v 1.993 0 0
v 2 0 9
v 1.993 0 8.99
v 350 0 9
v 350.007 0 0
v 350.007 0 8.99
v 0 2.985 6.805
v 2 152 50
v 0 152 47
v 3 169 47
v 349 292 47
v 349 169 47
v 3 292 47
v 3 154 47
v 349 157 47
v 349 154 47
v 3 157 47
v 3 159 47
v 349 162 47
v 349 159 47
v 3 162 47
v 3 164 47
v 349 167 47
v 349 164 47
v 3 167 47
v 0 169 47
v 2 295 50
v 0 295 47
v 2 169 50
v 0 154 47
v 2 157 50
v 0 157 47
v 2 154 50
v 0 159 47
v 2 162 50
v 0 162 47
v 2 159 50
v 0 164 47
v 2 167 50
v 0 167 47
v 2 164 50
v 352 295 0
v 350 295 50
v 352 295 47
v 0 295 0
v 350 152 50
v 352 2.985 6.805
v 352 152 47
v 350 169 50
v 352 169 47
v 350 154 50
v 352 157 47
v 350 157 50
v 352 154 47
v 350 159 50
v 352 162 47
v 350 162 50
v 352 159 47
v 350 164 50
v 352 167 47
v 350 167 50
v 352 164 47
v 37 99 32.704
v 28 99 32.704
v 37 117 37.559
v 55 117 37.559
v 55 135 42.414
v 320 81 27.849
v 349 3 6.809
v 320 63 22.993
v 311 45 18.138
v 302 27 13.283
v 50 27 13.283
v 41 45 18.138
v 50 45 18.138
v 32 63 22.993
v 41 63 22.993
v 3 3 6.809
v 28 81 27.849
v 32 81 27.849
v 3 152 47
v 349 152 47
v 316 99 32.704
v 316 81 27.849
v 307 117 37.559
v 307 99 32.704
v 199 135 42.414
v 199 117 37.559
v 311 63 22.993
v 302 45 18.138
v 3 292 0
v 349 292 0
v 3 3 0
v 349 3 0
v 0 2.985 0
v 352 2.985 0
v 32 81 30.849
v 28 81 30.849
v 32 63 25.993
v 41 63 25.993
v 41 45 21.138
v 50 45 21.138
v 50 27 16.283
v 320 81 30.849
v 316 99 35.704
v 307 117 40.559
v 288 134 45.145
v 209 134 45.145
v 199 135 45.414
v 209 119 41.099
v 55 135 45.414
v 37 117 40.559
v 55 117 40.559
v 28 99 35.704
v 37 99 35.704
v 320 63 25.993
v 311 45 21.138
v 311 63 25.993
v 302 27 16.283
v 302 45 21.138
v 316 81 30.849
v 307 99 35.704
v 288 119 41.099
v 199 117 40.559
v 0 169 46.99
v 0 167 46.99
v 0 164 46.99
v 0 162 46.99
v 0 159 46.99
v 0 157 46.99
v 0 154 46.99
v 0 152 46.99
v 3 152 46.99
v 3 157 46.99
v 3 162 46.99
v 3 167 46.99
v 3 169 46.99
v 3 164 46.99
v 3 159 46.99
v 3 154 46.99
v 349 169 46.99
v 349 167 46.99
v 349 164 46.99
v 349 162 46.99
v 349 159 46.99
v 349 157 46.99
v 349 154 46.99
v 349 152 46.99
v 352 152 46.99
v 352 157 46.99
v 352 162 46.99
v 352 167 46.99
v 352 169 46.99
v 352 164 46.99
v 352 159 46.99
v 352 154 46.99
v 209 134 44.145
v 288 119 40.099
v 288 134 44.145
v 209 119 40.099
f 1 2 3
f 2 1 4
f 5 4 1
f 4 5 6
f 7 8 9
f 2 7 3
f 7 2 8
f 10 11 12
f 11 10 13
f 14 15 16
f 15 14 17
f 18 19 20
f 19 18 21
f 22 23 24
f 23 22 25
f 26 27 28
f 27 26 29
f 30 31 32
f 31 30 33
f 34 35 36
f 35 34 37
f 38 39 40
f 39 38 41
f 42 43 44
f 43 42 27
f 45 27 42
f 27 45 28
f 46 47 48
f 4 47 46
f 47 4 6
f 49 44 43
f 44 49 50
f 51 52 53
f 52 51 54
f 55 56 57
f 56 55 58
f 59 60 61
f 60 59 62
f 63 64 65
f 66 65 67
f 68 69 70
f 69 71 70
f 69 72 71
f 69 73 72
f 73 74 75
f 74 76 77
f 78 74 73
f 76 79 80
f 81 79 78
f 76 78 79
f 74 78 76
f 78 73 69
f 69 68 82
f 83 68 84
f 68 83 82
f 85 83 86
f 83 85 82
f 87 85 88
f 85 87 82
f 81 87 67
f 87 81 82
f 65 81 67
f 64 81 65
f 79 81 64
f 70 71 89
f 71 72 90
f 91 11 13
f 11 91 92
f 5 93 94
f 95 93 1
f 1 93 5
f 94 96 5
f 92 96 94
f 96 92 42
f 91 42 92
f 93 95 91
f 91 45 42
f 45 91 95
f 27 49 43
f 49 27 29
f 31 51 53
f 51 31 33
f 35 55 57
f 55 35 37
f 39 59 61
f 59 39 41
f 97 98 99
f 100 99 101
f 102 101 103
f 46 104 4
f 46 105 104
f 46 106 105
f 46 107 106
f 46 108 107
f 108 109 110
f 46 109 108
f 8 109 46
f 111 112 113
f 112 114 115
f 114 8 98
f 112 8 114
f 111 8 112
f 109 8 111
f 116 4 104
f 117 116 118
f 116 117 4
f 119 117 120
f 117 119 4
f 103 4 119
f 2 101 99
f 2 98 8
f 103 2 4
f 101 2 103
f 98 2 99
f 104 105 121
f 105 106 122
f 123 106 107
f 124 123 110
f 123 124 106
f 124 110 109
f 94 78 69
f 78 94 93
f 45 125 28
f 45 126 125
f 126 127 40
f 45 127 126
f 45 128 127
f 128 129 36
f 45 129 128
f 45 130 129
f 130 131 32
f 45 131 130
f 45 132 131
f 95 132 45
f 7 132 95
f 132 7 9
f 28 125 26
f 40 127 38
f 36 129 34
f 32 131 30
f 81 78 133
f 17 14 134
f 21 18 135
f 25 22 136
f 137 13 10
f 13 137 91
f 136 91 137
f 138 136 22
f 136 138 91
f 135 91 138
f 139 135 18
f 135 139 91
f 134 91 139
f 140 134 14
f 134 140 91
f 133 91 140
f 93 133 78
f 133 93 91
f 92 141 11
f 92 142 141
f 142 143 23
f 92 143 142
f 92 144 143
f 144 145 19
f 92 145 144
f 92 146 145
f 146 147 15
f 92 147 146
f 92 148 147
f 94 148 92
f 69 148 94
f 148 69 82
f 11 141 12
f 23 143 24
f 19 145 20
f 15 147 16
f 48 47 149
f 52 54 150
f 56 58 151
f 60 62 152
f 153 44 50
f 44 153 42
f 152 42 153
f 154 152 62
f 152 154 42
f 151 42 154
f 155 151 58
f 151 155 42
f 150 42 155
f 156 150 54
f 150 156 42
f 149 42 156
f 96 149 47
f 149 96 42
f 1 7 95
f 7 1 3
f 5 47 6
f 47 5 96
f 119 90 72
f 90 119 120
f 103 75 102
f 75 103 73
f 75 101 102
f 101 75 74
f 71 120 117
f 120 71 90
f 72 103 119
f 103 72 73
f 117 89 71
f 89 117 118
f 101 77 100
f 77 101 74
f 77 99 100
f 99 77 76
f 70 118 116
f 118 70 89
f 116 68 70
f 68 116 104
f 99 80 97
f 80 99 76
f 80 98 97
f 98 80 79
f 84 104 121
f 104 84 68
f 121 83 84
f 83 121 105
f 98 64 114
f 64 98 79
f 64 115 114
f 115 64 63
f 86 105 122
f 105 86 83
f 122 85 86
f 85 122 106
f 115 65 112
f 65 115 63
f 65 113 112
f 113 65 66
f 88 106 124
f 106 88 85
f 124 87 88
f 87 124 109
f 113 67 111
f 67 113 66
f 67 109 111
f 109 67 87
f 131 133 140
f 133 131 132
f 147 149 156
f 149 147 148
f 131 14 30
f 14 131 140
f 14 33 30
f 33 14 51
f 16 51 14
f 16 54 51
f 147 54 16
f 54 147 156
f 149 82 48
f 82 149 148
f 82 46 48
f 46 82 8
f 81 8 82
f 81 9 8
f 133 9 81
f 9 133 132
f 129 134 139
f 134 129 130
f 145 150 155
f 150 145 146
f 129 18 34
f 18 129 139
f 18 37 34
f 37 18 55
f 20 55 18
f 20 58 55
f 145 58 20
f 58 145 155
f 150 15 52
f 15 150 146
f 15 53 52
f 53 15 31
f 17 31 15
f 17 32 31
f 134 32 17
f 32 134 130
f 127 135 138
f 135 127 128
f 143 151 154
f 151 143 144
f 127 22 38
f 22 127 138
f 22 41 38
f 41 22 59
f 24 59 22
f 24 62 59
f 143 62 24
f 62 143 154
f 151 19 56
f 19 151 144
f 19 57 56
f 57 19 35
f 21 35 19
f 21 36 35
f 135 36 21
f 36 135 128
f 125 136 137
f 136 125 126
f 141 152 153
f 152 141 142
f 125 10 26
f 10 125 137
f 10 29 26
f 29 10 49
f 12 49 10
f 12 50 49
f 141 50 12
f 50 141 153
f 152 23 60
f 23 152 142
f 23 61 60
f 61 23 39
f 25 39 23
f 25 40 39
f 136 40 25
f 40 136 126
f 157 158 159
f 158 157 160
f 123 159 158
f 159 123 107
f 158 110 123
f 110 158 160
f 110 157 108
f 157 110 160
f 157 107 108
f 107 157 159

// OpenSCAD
// Juku top case
// Units: millimeters

outside_width = 352;
outside_depth = 295;
rear_height = 50;
front_height = 9;
wall_thickness = 3;
slope_starts_from_back = 143;
keyboard_row_front_offset = 27;
keyboard_row_left_offset = 50;
keyboard_row_width = 252;
keyboard_row_depth = 18;
keyboard_row_side_step = 9;
keyboard_row_4_left_shift = 4;
keyboard_row_6_right_shift = 18;
keyboard_row_6_width = 144;
side_wall_chamfer_height = 3;
side_wall_chamfer_width = 2;
side_wall_chamfer_z_overlap = 1;
vent_cut_count = 4;
vent_cut_width = 2;
vent_cut_gap = 3;
logo_bevel_width = 79;
logo_bevel_depth_y = 15;
logo_bevel_depth_z = 1;
logo_bevel_x_gap_from_top_row = 10;
logo_bevel_y_gap_from_row_5 = 2;

slope_start_y = outside_depth - slope_starts_from_back;
cut_overlap = 0.01;

assert(wall_thickness > 0);
assert(2 * wall_thickness < outside_width);
assert(2 * wall_thickness < outside_depth);
assert(wall_thickness < front_height);
assert(front_height < rear_height);
assert(slope_starts_from_back > 0);
assert(slope_starts_from_back < outside_depth);
assert(keyboard_row_front_offset > 0);
assert(keyboard_row_left_offset > wall_thickness);
assert(keyboard_row_width > 0);
assert(keyboard_row_depth > 0);
assert(keyboard_row_side_step > 0);
assert(keyboard_row_6_width > 0);
assert(side_wall_chamfer_height > 0);
assert(side_wall_chamfer_width > 0);
assert(side_wall_chamfer_height < front_height);
assert(side_wall_chamfer_width < wall_thickness);
assert(side_wall_chamfer_z_overlap >= 0);
assert(vent_cut_count > 0);
assert(vent_cut_width > 0);
assert(vent_cut_gap > 0);
assert(logo_bevel_width > 0);
assert(logo_bevel_depth_y > 0);
assert(logo_bevel_depth_z > 0);
assert(logo_bevel_depth_z < wall_thickness);
assert(logo_bevel_x_gap_from_top_row >= 0);
assert(logo_bevel_y_gap_from_row_5 >= 0);
assert(
    slope_start_y
    + vent_cut_count * vent_cut_width
    + (vent_cut_count - 1) * vent_cut_gap
    < outside_depth - wall_thickness
);

function top_height_at(y) =
    y < slope_start_y
        ? front_height
            + (rear_height - front_height) * y / slope_start_y
        : rear_height;

function inner_top_height_at(y) = top_height_at(y) - wall_thickness;

module shell_profile_2d() {
    polygon([
        [0, 0],
        [wall_thickness, 0],
        [wall_thickness, inner_top_height_at(wall_thickness)],
        [slope_start_y, inner_top_height_at(slope_start_y)],
        [
            outside_depth - wall_thickness,
            inner_top_height_at(outside_depth - wall_thickness)
        ],
        [outside_depth - wall_thickness, 0],
        [outside_depth, 0],
        [outside_depth, rear_height],
        [slope_start_y, rear_height],
        [0, front_height]
    ]);
}

module shell(width) {
    multmatrix([
        [0, 0, 1, 0],
        [1, 0, 0, 0],
        [0, 1, 0, 0],
        [0, 0, 0, 1]
    ])
        linear_extrude(height = width)
            shell_profile_2d();
}

module side_wall_profile_2d() {
    polygon([
        [0, 0],
        [outside_depth, 0],
        [outside_depth, inner_top_height_at(outside_depth)],
        [slope_start_y, inner_top_height_at(slope_start_y)],
        [0, inner_top_height_at(0)]
    ]);
}

module side_wall(x) {
    translate([x, 0, 0])
        multmatrix([
            [0, 0, 1, 0],
            [1, 0, 0, 0],
            [0, 1, 0, 0],
            [0, 0, 0, 1]
        ])
            linear_extrude(height = wall_thickness)
                side_wall_profile_2d();
}

module side_top_chamfer_fill_segment(x_outer, x_inner, y0, y1) {
    z0 = top_height_at(y0);
    z1 = top_height_at(y1);

    polyhedron(
        points = [
            [x_outer, y0, z0 - side_wall_chamfer_height],
            [x_inner, y0, z0 - side_wall_chamfer_height],
            [x_inner, y0, z0],

            [x_outer, y1, z1 - side_wall_chamfer_height],
            [x_inner, y1, z1 - side_wall_chamfer_height],
            [x_inner, y1, z1]
        ],
        faces = [
            [0, 2, 1],
            [3, 4, 5],
            [0, 3, 5, 2],
            [0, 1, 4, 3],
            [1, 2, 5, 4]
        ]
    );
}

module front_side_chamfer_cut(x_outer, x_inner) {
    translate([0, 0, -cut_overlap])
        linear_extrude(
            height =
                front_height
                + side_wall_chamfer_z_overlap
                + 2 * cut_overlap
        )
            polygon([
                [x_outer, -cut_overlap],
                [x_inner, -cut_overlap],
                [x_outer, side_wall_chamfer_height]
            ]);
}

module left_side_top_chamfers() {
    side_top_chamfer_fill_segment(
        0,
        side_wall_chamfer_width,
        0,
        slope_start_y
    );
    side_top_chamfer_fill_segment(
        0,
        side_wall_chamfer_width,
        slope_start_y,
        outside_depth
    );
}

module right_side_top_chamfers() {
    translate([outside_width, 0, 0])
        mirror([1, 0, 0])
            left_side_top_chamfers();
}

module side_top_chamfers() {
    left_side_top_chamfers();
    right_side_top_chamfers();
}

module side_wall_chamfer_cuts() {
    front_side_chamfer_cut(
        -cut_overlap,
        side_wall_chamfer_width
    );
    front_side_chamfer_cut(
        outside_width + cut_overlap,
        outside_width - side_wall_chamfer_width
    );
}

module keyboard_row_cut(x, y, width) {
    translate([x, y, -cut_overlap])
        cube([
            width,
            keyboard_row_depth,
            rear_height + 2 * cut_overlap
        ]);
}

module keyboard_cutout() {
    row_1_x = keyboard_row_left_offset;
    row_1_y = keyboard_row_front_offset;
    row_1_width = keyboard_row_width;

    row_2_x = row_1_x - keyboard_row_side_step;
    row_2_y = row_1_y + keyboard_row_depth;
    row_2_width = row_1_width + 2 * keyboard_row_side_step;

    row_3_x = row_2_x - keyboard_row_side_step;
    row_3_y = row_2_y + keyboard_row_depth;
    row_3_width = row_2_width + 2 * keyboard_row_side_step;

    row_4_x = row_3_x - keyboard_row_4_left_shift;
    row_4_y = row_3_y + keyboard_row_depth;
    row_4_width = row_3_width;

    row_5_x = row_4_x + keyboard_row_side_step;
    row_5_y = row_4_y + keyboard_row_depth;
    row_5_width = row_4_width - 2 * keyboard_row_side_step;

    row_6_x = row_5_x + keyboard_row_6_right_shift;
    row_6_y = row_5_y + keyboard_row_depth;

    keyboard_row_cut(row_1_x, row_1_y, row_1_width);
    keyboard_row_cut(row_2_x, row_2_y, row_2_width);
    keyboard_row_cut(row_3_x, row_3_y, row_3_width);
    keyboard_row_cut(row_4_x, row_4_y, row_4_width);
    keyboard_row_cut(row_5_x, row_5_y, row_5_width);
    keyboard_row_cut(row_6_x, row_6_y, keyboard_row_6_width);
}

module sloped_rect_recess_cut(x, y, width, depth_y, depth_z) {
    x0 = x;
    x1 = x + width;
    y0 = y;
    y1 = y + depth_y;
    z0 = top_height_at(y0);
    z1 = top_height_at(y1);

    polyhedron(
        points = [
            [x0, y0, z0 - depth_z],
            [x1, y0, z0 - depth_z],
            [x1, y1, z1 - depth_z],
            [x0, y1, z1 - depth_z],

            [x0, y0, z0 + cut_overlap],
            [x1, y0, z0 + cut_overlap],
            [x1, y1, z1 + cut_overlap],
            [x0, y1, z1 + cut_overlap]
        ],
        faces = [
            [0, 1, 2, 3],
            [4, 7, 6, 5],
            [0, 4, 5, 1],
            [1, 5, 6, 2],
            [2, 6, 7, 3],
            [3, 7, 4, 0]
        ]
    );
}

module logo_bevel_cut() {
    row_1_x = keyboard_row_left_offset;
    row_2_x = row_1_x - keyboard_row_side_step;
    row_3_x = row_2_x - keyboard_row_side_step;
    row_4_x = row_3_x - keyboard_row_4_left_shift;
    row_5_x = row_4_x + keyboard_row_side_step;
    row_6_x = row_5_x + keyboard_row_6_right_shift;

    row_1_y = keyboard_row_front_offset;
    row_2_y = row_1_y + keyboard_row_depth;
    row_3_y = row_2_y + keyboard_row_depth;
    row_4_y = row_3_y + keyboard_row_depth;
    row_5_y = row_4_y + keyboard_row_depth;

    logo_x =
        row_6_x
        + keyboard_row_6_width
        + logo_bevel_x_gap_from_top_row;
    logo_y =
        row_5_y
        + keyboard_row_depth
        + logo_bevel_y_gap_from_row_5;

    sloped_rect_recess_cut(
        logo_x,
        logo_y,
        logo_bevel_width,
        logo_bevel_depth_y,
        logo_bevel_depth_z
    );
}

module vent_cut(y) {
    translate([
        -cut_overlap,
        y,
        inner_top_height_at(y) - cut_overlap
    ])
        cube([
            outside_width + 2 * cut_overlap,
            vent_cut_width,
            wall_thickness + 2 * cut_overlap
        ]);
}

module ventilation_cutouts() {
    for (i = [0 : vent_cut_count - 1])
        vent_cut(
            slope_start_y + i * (vent_cut_width + vent_cut_gap)
        );
}

module top_case() {
    difference() {
        union() {
            translate([side_wall_chamfer_width, 0, 0])
                shell(outside_width - 2 * side_wall_chamfer_width);
            side_wall(0);
            side_wall(outside_width - wall_thickness);
            side_top_chamfers();
        }

        side_wall_chamfer_cuts();
        keyboard_cutout();
        logo_bevel_cut();
        ventilation_cutouts();
    }
}

top_case();
